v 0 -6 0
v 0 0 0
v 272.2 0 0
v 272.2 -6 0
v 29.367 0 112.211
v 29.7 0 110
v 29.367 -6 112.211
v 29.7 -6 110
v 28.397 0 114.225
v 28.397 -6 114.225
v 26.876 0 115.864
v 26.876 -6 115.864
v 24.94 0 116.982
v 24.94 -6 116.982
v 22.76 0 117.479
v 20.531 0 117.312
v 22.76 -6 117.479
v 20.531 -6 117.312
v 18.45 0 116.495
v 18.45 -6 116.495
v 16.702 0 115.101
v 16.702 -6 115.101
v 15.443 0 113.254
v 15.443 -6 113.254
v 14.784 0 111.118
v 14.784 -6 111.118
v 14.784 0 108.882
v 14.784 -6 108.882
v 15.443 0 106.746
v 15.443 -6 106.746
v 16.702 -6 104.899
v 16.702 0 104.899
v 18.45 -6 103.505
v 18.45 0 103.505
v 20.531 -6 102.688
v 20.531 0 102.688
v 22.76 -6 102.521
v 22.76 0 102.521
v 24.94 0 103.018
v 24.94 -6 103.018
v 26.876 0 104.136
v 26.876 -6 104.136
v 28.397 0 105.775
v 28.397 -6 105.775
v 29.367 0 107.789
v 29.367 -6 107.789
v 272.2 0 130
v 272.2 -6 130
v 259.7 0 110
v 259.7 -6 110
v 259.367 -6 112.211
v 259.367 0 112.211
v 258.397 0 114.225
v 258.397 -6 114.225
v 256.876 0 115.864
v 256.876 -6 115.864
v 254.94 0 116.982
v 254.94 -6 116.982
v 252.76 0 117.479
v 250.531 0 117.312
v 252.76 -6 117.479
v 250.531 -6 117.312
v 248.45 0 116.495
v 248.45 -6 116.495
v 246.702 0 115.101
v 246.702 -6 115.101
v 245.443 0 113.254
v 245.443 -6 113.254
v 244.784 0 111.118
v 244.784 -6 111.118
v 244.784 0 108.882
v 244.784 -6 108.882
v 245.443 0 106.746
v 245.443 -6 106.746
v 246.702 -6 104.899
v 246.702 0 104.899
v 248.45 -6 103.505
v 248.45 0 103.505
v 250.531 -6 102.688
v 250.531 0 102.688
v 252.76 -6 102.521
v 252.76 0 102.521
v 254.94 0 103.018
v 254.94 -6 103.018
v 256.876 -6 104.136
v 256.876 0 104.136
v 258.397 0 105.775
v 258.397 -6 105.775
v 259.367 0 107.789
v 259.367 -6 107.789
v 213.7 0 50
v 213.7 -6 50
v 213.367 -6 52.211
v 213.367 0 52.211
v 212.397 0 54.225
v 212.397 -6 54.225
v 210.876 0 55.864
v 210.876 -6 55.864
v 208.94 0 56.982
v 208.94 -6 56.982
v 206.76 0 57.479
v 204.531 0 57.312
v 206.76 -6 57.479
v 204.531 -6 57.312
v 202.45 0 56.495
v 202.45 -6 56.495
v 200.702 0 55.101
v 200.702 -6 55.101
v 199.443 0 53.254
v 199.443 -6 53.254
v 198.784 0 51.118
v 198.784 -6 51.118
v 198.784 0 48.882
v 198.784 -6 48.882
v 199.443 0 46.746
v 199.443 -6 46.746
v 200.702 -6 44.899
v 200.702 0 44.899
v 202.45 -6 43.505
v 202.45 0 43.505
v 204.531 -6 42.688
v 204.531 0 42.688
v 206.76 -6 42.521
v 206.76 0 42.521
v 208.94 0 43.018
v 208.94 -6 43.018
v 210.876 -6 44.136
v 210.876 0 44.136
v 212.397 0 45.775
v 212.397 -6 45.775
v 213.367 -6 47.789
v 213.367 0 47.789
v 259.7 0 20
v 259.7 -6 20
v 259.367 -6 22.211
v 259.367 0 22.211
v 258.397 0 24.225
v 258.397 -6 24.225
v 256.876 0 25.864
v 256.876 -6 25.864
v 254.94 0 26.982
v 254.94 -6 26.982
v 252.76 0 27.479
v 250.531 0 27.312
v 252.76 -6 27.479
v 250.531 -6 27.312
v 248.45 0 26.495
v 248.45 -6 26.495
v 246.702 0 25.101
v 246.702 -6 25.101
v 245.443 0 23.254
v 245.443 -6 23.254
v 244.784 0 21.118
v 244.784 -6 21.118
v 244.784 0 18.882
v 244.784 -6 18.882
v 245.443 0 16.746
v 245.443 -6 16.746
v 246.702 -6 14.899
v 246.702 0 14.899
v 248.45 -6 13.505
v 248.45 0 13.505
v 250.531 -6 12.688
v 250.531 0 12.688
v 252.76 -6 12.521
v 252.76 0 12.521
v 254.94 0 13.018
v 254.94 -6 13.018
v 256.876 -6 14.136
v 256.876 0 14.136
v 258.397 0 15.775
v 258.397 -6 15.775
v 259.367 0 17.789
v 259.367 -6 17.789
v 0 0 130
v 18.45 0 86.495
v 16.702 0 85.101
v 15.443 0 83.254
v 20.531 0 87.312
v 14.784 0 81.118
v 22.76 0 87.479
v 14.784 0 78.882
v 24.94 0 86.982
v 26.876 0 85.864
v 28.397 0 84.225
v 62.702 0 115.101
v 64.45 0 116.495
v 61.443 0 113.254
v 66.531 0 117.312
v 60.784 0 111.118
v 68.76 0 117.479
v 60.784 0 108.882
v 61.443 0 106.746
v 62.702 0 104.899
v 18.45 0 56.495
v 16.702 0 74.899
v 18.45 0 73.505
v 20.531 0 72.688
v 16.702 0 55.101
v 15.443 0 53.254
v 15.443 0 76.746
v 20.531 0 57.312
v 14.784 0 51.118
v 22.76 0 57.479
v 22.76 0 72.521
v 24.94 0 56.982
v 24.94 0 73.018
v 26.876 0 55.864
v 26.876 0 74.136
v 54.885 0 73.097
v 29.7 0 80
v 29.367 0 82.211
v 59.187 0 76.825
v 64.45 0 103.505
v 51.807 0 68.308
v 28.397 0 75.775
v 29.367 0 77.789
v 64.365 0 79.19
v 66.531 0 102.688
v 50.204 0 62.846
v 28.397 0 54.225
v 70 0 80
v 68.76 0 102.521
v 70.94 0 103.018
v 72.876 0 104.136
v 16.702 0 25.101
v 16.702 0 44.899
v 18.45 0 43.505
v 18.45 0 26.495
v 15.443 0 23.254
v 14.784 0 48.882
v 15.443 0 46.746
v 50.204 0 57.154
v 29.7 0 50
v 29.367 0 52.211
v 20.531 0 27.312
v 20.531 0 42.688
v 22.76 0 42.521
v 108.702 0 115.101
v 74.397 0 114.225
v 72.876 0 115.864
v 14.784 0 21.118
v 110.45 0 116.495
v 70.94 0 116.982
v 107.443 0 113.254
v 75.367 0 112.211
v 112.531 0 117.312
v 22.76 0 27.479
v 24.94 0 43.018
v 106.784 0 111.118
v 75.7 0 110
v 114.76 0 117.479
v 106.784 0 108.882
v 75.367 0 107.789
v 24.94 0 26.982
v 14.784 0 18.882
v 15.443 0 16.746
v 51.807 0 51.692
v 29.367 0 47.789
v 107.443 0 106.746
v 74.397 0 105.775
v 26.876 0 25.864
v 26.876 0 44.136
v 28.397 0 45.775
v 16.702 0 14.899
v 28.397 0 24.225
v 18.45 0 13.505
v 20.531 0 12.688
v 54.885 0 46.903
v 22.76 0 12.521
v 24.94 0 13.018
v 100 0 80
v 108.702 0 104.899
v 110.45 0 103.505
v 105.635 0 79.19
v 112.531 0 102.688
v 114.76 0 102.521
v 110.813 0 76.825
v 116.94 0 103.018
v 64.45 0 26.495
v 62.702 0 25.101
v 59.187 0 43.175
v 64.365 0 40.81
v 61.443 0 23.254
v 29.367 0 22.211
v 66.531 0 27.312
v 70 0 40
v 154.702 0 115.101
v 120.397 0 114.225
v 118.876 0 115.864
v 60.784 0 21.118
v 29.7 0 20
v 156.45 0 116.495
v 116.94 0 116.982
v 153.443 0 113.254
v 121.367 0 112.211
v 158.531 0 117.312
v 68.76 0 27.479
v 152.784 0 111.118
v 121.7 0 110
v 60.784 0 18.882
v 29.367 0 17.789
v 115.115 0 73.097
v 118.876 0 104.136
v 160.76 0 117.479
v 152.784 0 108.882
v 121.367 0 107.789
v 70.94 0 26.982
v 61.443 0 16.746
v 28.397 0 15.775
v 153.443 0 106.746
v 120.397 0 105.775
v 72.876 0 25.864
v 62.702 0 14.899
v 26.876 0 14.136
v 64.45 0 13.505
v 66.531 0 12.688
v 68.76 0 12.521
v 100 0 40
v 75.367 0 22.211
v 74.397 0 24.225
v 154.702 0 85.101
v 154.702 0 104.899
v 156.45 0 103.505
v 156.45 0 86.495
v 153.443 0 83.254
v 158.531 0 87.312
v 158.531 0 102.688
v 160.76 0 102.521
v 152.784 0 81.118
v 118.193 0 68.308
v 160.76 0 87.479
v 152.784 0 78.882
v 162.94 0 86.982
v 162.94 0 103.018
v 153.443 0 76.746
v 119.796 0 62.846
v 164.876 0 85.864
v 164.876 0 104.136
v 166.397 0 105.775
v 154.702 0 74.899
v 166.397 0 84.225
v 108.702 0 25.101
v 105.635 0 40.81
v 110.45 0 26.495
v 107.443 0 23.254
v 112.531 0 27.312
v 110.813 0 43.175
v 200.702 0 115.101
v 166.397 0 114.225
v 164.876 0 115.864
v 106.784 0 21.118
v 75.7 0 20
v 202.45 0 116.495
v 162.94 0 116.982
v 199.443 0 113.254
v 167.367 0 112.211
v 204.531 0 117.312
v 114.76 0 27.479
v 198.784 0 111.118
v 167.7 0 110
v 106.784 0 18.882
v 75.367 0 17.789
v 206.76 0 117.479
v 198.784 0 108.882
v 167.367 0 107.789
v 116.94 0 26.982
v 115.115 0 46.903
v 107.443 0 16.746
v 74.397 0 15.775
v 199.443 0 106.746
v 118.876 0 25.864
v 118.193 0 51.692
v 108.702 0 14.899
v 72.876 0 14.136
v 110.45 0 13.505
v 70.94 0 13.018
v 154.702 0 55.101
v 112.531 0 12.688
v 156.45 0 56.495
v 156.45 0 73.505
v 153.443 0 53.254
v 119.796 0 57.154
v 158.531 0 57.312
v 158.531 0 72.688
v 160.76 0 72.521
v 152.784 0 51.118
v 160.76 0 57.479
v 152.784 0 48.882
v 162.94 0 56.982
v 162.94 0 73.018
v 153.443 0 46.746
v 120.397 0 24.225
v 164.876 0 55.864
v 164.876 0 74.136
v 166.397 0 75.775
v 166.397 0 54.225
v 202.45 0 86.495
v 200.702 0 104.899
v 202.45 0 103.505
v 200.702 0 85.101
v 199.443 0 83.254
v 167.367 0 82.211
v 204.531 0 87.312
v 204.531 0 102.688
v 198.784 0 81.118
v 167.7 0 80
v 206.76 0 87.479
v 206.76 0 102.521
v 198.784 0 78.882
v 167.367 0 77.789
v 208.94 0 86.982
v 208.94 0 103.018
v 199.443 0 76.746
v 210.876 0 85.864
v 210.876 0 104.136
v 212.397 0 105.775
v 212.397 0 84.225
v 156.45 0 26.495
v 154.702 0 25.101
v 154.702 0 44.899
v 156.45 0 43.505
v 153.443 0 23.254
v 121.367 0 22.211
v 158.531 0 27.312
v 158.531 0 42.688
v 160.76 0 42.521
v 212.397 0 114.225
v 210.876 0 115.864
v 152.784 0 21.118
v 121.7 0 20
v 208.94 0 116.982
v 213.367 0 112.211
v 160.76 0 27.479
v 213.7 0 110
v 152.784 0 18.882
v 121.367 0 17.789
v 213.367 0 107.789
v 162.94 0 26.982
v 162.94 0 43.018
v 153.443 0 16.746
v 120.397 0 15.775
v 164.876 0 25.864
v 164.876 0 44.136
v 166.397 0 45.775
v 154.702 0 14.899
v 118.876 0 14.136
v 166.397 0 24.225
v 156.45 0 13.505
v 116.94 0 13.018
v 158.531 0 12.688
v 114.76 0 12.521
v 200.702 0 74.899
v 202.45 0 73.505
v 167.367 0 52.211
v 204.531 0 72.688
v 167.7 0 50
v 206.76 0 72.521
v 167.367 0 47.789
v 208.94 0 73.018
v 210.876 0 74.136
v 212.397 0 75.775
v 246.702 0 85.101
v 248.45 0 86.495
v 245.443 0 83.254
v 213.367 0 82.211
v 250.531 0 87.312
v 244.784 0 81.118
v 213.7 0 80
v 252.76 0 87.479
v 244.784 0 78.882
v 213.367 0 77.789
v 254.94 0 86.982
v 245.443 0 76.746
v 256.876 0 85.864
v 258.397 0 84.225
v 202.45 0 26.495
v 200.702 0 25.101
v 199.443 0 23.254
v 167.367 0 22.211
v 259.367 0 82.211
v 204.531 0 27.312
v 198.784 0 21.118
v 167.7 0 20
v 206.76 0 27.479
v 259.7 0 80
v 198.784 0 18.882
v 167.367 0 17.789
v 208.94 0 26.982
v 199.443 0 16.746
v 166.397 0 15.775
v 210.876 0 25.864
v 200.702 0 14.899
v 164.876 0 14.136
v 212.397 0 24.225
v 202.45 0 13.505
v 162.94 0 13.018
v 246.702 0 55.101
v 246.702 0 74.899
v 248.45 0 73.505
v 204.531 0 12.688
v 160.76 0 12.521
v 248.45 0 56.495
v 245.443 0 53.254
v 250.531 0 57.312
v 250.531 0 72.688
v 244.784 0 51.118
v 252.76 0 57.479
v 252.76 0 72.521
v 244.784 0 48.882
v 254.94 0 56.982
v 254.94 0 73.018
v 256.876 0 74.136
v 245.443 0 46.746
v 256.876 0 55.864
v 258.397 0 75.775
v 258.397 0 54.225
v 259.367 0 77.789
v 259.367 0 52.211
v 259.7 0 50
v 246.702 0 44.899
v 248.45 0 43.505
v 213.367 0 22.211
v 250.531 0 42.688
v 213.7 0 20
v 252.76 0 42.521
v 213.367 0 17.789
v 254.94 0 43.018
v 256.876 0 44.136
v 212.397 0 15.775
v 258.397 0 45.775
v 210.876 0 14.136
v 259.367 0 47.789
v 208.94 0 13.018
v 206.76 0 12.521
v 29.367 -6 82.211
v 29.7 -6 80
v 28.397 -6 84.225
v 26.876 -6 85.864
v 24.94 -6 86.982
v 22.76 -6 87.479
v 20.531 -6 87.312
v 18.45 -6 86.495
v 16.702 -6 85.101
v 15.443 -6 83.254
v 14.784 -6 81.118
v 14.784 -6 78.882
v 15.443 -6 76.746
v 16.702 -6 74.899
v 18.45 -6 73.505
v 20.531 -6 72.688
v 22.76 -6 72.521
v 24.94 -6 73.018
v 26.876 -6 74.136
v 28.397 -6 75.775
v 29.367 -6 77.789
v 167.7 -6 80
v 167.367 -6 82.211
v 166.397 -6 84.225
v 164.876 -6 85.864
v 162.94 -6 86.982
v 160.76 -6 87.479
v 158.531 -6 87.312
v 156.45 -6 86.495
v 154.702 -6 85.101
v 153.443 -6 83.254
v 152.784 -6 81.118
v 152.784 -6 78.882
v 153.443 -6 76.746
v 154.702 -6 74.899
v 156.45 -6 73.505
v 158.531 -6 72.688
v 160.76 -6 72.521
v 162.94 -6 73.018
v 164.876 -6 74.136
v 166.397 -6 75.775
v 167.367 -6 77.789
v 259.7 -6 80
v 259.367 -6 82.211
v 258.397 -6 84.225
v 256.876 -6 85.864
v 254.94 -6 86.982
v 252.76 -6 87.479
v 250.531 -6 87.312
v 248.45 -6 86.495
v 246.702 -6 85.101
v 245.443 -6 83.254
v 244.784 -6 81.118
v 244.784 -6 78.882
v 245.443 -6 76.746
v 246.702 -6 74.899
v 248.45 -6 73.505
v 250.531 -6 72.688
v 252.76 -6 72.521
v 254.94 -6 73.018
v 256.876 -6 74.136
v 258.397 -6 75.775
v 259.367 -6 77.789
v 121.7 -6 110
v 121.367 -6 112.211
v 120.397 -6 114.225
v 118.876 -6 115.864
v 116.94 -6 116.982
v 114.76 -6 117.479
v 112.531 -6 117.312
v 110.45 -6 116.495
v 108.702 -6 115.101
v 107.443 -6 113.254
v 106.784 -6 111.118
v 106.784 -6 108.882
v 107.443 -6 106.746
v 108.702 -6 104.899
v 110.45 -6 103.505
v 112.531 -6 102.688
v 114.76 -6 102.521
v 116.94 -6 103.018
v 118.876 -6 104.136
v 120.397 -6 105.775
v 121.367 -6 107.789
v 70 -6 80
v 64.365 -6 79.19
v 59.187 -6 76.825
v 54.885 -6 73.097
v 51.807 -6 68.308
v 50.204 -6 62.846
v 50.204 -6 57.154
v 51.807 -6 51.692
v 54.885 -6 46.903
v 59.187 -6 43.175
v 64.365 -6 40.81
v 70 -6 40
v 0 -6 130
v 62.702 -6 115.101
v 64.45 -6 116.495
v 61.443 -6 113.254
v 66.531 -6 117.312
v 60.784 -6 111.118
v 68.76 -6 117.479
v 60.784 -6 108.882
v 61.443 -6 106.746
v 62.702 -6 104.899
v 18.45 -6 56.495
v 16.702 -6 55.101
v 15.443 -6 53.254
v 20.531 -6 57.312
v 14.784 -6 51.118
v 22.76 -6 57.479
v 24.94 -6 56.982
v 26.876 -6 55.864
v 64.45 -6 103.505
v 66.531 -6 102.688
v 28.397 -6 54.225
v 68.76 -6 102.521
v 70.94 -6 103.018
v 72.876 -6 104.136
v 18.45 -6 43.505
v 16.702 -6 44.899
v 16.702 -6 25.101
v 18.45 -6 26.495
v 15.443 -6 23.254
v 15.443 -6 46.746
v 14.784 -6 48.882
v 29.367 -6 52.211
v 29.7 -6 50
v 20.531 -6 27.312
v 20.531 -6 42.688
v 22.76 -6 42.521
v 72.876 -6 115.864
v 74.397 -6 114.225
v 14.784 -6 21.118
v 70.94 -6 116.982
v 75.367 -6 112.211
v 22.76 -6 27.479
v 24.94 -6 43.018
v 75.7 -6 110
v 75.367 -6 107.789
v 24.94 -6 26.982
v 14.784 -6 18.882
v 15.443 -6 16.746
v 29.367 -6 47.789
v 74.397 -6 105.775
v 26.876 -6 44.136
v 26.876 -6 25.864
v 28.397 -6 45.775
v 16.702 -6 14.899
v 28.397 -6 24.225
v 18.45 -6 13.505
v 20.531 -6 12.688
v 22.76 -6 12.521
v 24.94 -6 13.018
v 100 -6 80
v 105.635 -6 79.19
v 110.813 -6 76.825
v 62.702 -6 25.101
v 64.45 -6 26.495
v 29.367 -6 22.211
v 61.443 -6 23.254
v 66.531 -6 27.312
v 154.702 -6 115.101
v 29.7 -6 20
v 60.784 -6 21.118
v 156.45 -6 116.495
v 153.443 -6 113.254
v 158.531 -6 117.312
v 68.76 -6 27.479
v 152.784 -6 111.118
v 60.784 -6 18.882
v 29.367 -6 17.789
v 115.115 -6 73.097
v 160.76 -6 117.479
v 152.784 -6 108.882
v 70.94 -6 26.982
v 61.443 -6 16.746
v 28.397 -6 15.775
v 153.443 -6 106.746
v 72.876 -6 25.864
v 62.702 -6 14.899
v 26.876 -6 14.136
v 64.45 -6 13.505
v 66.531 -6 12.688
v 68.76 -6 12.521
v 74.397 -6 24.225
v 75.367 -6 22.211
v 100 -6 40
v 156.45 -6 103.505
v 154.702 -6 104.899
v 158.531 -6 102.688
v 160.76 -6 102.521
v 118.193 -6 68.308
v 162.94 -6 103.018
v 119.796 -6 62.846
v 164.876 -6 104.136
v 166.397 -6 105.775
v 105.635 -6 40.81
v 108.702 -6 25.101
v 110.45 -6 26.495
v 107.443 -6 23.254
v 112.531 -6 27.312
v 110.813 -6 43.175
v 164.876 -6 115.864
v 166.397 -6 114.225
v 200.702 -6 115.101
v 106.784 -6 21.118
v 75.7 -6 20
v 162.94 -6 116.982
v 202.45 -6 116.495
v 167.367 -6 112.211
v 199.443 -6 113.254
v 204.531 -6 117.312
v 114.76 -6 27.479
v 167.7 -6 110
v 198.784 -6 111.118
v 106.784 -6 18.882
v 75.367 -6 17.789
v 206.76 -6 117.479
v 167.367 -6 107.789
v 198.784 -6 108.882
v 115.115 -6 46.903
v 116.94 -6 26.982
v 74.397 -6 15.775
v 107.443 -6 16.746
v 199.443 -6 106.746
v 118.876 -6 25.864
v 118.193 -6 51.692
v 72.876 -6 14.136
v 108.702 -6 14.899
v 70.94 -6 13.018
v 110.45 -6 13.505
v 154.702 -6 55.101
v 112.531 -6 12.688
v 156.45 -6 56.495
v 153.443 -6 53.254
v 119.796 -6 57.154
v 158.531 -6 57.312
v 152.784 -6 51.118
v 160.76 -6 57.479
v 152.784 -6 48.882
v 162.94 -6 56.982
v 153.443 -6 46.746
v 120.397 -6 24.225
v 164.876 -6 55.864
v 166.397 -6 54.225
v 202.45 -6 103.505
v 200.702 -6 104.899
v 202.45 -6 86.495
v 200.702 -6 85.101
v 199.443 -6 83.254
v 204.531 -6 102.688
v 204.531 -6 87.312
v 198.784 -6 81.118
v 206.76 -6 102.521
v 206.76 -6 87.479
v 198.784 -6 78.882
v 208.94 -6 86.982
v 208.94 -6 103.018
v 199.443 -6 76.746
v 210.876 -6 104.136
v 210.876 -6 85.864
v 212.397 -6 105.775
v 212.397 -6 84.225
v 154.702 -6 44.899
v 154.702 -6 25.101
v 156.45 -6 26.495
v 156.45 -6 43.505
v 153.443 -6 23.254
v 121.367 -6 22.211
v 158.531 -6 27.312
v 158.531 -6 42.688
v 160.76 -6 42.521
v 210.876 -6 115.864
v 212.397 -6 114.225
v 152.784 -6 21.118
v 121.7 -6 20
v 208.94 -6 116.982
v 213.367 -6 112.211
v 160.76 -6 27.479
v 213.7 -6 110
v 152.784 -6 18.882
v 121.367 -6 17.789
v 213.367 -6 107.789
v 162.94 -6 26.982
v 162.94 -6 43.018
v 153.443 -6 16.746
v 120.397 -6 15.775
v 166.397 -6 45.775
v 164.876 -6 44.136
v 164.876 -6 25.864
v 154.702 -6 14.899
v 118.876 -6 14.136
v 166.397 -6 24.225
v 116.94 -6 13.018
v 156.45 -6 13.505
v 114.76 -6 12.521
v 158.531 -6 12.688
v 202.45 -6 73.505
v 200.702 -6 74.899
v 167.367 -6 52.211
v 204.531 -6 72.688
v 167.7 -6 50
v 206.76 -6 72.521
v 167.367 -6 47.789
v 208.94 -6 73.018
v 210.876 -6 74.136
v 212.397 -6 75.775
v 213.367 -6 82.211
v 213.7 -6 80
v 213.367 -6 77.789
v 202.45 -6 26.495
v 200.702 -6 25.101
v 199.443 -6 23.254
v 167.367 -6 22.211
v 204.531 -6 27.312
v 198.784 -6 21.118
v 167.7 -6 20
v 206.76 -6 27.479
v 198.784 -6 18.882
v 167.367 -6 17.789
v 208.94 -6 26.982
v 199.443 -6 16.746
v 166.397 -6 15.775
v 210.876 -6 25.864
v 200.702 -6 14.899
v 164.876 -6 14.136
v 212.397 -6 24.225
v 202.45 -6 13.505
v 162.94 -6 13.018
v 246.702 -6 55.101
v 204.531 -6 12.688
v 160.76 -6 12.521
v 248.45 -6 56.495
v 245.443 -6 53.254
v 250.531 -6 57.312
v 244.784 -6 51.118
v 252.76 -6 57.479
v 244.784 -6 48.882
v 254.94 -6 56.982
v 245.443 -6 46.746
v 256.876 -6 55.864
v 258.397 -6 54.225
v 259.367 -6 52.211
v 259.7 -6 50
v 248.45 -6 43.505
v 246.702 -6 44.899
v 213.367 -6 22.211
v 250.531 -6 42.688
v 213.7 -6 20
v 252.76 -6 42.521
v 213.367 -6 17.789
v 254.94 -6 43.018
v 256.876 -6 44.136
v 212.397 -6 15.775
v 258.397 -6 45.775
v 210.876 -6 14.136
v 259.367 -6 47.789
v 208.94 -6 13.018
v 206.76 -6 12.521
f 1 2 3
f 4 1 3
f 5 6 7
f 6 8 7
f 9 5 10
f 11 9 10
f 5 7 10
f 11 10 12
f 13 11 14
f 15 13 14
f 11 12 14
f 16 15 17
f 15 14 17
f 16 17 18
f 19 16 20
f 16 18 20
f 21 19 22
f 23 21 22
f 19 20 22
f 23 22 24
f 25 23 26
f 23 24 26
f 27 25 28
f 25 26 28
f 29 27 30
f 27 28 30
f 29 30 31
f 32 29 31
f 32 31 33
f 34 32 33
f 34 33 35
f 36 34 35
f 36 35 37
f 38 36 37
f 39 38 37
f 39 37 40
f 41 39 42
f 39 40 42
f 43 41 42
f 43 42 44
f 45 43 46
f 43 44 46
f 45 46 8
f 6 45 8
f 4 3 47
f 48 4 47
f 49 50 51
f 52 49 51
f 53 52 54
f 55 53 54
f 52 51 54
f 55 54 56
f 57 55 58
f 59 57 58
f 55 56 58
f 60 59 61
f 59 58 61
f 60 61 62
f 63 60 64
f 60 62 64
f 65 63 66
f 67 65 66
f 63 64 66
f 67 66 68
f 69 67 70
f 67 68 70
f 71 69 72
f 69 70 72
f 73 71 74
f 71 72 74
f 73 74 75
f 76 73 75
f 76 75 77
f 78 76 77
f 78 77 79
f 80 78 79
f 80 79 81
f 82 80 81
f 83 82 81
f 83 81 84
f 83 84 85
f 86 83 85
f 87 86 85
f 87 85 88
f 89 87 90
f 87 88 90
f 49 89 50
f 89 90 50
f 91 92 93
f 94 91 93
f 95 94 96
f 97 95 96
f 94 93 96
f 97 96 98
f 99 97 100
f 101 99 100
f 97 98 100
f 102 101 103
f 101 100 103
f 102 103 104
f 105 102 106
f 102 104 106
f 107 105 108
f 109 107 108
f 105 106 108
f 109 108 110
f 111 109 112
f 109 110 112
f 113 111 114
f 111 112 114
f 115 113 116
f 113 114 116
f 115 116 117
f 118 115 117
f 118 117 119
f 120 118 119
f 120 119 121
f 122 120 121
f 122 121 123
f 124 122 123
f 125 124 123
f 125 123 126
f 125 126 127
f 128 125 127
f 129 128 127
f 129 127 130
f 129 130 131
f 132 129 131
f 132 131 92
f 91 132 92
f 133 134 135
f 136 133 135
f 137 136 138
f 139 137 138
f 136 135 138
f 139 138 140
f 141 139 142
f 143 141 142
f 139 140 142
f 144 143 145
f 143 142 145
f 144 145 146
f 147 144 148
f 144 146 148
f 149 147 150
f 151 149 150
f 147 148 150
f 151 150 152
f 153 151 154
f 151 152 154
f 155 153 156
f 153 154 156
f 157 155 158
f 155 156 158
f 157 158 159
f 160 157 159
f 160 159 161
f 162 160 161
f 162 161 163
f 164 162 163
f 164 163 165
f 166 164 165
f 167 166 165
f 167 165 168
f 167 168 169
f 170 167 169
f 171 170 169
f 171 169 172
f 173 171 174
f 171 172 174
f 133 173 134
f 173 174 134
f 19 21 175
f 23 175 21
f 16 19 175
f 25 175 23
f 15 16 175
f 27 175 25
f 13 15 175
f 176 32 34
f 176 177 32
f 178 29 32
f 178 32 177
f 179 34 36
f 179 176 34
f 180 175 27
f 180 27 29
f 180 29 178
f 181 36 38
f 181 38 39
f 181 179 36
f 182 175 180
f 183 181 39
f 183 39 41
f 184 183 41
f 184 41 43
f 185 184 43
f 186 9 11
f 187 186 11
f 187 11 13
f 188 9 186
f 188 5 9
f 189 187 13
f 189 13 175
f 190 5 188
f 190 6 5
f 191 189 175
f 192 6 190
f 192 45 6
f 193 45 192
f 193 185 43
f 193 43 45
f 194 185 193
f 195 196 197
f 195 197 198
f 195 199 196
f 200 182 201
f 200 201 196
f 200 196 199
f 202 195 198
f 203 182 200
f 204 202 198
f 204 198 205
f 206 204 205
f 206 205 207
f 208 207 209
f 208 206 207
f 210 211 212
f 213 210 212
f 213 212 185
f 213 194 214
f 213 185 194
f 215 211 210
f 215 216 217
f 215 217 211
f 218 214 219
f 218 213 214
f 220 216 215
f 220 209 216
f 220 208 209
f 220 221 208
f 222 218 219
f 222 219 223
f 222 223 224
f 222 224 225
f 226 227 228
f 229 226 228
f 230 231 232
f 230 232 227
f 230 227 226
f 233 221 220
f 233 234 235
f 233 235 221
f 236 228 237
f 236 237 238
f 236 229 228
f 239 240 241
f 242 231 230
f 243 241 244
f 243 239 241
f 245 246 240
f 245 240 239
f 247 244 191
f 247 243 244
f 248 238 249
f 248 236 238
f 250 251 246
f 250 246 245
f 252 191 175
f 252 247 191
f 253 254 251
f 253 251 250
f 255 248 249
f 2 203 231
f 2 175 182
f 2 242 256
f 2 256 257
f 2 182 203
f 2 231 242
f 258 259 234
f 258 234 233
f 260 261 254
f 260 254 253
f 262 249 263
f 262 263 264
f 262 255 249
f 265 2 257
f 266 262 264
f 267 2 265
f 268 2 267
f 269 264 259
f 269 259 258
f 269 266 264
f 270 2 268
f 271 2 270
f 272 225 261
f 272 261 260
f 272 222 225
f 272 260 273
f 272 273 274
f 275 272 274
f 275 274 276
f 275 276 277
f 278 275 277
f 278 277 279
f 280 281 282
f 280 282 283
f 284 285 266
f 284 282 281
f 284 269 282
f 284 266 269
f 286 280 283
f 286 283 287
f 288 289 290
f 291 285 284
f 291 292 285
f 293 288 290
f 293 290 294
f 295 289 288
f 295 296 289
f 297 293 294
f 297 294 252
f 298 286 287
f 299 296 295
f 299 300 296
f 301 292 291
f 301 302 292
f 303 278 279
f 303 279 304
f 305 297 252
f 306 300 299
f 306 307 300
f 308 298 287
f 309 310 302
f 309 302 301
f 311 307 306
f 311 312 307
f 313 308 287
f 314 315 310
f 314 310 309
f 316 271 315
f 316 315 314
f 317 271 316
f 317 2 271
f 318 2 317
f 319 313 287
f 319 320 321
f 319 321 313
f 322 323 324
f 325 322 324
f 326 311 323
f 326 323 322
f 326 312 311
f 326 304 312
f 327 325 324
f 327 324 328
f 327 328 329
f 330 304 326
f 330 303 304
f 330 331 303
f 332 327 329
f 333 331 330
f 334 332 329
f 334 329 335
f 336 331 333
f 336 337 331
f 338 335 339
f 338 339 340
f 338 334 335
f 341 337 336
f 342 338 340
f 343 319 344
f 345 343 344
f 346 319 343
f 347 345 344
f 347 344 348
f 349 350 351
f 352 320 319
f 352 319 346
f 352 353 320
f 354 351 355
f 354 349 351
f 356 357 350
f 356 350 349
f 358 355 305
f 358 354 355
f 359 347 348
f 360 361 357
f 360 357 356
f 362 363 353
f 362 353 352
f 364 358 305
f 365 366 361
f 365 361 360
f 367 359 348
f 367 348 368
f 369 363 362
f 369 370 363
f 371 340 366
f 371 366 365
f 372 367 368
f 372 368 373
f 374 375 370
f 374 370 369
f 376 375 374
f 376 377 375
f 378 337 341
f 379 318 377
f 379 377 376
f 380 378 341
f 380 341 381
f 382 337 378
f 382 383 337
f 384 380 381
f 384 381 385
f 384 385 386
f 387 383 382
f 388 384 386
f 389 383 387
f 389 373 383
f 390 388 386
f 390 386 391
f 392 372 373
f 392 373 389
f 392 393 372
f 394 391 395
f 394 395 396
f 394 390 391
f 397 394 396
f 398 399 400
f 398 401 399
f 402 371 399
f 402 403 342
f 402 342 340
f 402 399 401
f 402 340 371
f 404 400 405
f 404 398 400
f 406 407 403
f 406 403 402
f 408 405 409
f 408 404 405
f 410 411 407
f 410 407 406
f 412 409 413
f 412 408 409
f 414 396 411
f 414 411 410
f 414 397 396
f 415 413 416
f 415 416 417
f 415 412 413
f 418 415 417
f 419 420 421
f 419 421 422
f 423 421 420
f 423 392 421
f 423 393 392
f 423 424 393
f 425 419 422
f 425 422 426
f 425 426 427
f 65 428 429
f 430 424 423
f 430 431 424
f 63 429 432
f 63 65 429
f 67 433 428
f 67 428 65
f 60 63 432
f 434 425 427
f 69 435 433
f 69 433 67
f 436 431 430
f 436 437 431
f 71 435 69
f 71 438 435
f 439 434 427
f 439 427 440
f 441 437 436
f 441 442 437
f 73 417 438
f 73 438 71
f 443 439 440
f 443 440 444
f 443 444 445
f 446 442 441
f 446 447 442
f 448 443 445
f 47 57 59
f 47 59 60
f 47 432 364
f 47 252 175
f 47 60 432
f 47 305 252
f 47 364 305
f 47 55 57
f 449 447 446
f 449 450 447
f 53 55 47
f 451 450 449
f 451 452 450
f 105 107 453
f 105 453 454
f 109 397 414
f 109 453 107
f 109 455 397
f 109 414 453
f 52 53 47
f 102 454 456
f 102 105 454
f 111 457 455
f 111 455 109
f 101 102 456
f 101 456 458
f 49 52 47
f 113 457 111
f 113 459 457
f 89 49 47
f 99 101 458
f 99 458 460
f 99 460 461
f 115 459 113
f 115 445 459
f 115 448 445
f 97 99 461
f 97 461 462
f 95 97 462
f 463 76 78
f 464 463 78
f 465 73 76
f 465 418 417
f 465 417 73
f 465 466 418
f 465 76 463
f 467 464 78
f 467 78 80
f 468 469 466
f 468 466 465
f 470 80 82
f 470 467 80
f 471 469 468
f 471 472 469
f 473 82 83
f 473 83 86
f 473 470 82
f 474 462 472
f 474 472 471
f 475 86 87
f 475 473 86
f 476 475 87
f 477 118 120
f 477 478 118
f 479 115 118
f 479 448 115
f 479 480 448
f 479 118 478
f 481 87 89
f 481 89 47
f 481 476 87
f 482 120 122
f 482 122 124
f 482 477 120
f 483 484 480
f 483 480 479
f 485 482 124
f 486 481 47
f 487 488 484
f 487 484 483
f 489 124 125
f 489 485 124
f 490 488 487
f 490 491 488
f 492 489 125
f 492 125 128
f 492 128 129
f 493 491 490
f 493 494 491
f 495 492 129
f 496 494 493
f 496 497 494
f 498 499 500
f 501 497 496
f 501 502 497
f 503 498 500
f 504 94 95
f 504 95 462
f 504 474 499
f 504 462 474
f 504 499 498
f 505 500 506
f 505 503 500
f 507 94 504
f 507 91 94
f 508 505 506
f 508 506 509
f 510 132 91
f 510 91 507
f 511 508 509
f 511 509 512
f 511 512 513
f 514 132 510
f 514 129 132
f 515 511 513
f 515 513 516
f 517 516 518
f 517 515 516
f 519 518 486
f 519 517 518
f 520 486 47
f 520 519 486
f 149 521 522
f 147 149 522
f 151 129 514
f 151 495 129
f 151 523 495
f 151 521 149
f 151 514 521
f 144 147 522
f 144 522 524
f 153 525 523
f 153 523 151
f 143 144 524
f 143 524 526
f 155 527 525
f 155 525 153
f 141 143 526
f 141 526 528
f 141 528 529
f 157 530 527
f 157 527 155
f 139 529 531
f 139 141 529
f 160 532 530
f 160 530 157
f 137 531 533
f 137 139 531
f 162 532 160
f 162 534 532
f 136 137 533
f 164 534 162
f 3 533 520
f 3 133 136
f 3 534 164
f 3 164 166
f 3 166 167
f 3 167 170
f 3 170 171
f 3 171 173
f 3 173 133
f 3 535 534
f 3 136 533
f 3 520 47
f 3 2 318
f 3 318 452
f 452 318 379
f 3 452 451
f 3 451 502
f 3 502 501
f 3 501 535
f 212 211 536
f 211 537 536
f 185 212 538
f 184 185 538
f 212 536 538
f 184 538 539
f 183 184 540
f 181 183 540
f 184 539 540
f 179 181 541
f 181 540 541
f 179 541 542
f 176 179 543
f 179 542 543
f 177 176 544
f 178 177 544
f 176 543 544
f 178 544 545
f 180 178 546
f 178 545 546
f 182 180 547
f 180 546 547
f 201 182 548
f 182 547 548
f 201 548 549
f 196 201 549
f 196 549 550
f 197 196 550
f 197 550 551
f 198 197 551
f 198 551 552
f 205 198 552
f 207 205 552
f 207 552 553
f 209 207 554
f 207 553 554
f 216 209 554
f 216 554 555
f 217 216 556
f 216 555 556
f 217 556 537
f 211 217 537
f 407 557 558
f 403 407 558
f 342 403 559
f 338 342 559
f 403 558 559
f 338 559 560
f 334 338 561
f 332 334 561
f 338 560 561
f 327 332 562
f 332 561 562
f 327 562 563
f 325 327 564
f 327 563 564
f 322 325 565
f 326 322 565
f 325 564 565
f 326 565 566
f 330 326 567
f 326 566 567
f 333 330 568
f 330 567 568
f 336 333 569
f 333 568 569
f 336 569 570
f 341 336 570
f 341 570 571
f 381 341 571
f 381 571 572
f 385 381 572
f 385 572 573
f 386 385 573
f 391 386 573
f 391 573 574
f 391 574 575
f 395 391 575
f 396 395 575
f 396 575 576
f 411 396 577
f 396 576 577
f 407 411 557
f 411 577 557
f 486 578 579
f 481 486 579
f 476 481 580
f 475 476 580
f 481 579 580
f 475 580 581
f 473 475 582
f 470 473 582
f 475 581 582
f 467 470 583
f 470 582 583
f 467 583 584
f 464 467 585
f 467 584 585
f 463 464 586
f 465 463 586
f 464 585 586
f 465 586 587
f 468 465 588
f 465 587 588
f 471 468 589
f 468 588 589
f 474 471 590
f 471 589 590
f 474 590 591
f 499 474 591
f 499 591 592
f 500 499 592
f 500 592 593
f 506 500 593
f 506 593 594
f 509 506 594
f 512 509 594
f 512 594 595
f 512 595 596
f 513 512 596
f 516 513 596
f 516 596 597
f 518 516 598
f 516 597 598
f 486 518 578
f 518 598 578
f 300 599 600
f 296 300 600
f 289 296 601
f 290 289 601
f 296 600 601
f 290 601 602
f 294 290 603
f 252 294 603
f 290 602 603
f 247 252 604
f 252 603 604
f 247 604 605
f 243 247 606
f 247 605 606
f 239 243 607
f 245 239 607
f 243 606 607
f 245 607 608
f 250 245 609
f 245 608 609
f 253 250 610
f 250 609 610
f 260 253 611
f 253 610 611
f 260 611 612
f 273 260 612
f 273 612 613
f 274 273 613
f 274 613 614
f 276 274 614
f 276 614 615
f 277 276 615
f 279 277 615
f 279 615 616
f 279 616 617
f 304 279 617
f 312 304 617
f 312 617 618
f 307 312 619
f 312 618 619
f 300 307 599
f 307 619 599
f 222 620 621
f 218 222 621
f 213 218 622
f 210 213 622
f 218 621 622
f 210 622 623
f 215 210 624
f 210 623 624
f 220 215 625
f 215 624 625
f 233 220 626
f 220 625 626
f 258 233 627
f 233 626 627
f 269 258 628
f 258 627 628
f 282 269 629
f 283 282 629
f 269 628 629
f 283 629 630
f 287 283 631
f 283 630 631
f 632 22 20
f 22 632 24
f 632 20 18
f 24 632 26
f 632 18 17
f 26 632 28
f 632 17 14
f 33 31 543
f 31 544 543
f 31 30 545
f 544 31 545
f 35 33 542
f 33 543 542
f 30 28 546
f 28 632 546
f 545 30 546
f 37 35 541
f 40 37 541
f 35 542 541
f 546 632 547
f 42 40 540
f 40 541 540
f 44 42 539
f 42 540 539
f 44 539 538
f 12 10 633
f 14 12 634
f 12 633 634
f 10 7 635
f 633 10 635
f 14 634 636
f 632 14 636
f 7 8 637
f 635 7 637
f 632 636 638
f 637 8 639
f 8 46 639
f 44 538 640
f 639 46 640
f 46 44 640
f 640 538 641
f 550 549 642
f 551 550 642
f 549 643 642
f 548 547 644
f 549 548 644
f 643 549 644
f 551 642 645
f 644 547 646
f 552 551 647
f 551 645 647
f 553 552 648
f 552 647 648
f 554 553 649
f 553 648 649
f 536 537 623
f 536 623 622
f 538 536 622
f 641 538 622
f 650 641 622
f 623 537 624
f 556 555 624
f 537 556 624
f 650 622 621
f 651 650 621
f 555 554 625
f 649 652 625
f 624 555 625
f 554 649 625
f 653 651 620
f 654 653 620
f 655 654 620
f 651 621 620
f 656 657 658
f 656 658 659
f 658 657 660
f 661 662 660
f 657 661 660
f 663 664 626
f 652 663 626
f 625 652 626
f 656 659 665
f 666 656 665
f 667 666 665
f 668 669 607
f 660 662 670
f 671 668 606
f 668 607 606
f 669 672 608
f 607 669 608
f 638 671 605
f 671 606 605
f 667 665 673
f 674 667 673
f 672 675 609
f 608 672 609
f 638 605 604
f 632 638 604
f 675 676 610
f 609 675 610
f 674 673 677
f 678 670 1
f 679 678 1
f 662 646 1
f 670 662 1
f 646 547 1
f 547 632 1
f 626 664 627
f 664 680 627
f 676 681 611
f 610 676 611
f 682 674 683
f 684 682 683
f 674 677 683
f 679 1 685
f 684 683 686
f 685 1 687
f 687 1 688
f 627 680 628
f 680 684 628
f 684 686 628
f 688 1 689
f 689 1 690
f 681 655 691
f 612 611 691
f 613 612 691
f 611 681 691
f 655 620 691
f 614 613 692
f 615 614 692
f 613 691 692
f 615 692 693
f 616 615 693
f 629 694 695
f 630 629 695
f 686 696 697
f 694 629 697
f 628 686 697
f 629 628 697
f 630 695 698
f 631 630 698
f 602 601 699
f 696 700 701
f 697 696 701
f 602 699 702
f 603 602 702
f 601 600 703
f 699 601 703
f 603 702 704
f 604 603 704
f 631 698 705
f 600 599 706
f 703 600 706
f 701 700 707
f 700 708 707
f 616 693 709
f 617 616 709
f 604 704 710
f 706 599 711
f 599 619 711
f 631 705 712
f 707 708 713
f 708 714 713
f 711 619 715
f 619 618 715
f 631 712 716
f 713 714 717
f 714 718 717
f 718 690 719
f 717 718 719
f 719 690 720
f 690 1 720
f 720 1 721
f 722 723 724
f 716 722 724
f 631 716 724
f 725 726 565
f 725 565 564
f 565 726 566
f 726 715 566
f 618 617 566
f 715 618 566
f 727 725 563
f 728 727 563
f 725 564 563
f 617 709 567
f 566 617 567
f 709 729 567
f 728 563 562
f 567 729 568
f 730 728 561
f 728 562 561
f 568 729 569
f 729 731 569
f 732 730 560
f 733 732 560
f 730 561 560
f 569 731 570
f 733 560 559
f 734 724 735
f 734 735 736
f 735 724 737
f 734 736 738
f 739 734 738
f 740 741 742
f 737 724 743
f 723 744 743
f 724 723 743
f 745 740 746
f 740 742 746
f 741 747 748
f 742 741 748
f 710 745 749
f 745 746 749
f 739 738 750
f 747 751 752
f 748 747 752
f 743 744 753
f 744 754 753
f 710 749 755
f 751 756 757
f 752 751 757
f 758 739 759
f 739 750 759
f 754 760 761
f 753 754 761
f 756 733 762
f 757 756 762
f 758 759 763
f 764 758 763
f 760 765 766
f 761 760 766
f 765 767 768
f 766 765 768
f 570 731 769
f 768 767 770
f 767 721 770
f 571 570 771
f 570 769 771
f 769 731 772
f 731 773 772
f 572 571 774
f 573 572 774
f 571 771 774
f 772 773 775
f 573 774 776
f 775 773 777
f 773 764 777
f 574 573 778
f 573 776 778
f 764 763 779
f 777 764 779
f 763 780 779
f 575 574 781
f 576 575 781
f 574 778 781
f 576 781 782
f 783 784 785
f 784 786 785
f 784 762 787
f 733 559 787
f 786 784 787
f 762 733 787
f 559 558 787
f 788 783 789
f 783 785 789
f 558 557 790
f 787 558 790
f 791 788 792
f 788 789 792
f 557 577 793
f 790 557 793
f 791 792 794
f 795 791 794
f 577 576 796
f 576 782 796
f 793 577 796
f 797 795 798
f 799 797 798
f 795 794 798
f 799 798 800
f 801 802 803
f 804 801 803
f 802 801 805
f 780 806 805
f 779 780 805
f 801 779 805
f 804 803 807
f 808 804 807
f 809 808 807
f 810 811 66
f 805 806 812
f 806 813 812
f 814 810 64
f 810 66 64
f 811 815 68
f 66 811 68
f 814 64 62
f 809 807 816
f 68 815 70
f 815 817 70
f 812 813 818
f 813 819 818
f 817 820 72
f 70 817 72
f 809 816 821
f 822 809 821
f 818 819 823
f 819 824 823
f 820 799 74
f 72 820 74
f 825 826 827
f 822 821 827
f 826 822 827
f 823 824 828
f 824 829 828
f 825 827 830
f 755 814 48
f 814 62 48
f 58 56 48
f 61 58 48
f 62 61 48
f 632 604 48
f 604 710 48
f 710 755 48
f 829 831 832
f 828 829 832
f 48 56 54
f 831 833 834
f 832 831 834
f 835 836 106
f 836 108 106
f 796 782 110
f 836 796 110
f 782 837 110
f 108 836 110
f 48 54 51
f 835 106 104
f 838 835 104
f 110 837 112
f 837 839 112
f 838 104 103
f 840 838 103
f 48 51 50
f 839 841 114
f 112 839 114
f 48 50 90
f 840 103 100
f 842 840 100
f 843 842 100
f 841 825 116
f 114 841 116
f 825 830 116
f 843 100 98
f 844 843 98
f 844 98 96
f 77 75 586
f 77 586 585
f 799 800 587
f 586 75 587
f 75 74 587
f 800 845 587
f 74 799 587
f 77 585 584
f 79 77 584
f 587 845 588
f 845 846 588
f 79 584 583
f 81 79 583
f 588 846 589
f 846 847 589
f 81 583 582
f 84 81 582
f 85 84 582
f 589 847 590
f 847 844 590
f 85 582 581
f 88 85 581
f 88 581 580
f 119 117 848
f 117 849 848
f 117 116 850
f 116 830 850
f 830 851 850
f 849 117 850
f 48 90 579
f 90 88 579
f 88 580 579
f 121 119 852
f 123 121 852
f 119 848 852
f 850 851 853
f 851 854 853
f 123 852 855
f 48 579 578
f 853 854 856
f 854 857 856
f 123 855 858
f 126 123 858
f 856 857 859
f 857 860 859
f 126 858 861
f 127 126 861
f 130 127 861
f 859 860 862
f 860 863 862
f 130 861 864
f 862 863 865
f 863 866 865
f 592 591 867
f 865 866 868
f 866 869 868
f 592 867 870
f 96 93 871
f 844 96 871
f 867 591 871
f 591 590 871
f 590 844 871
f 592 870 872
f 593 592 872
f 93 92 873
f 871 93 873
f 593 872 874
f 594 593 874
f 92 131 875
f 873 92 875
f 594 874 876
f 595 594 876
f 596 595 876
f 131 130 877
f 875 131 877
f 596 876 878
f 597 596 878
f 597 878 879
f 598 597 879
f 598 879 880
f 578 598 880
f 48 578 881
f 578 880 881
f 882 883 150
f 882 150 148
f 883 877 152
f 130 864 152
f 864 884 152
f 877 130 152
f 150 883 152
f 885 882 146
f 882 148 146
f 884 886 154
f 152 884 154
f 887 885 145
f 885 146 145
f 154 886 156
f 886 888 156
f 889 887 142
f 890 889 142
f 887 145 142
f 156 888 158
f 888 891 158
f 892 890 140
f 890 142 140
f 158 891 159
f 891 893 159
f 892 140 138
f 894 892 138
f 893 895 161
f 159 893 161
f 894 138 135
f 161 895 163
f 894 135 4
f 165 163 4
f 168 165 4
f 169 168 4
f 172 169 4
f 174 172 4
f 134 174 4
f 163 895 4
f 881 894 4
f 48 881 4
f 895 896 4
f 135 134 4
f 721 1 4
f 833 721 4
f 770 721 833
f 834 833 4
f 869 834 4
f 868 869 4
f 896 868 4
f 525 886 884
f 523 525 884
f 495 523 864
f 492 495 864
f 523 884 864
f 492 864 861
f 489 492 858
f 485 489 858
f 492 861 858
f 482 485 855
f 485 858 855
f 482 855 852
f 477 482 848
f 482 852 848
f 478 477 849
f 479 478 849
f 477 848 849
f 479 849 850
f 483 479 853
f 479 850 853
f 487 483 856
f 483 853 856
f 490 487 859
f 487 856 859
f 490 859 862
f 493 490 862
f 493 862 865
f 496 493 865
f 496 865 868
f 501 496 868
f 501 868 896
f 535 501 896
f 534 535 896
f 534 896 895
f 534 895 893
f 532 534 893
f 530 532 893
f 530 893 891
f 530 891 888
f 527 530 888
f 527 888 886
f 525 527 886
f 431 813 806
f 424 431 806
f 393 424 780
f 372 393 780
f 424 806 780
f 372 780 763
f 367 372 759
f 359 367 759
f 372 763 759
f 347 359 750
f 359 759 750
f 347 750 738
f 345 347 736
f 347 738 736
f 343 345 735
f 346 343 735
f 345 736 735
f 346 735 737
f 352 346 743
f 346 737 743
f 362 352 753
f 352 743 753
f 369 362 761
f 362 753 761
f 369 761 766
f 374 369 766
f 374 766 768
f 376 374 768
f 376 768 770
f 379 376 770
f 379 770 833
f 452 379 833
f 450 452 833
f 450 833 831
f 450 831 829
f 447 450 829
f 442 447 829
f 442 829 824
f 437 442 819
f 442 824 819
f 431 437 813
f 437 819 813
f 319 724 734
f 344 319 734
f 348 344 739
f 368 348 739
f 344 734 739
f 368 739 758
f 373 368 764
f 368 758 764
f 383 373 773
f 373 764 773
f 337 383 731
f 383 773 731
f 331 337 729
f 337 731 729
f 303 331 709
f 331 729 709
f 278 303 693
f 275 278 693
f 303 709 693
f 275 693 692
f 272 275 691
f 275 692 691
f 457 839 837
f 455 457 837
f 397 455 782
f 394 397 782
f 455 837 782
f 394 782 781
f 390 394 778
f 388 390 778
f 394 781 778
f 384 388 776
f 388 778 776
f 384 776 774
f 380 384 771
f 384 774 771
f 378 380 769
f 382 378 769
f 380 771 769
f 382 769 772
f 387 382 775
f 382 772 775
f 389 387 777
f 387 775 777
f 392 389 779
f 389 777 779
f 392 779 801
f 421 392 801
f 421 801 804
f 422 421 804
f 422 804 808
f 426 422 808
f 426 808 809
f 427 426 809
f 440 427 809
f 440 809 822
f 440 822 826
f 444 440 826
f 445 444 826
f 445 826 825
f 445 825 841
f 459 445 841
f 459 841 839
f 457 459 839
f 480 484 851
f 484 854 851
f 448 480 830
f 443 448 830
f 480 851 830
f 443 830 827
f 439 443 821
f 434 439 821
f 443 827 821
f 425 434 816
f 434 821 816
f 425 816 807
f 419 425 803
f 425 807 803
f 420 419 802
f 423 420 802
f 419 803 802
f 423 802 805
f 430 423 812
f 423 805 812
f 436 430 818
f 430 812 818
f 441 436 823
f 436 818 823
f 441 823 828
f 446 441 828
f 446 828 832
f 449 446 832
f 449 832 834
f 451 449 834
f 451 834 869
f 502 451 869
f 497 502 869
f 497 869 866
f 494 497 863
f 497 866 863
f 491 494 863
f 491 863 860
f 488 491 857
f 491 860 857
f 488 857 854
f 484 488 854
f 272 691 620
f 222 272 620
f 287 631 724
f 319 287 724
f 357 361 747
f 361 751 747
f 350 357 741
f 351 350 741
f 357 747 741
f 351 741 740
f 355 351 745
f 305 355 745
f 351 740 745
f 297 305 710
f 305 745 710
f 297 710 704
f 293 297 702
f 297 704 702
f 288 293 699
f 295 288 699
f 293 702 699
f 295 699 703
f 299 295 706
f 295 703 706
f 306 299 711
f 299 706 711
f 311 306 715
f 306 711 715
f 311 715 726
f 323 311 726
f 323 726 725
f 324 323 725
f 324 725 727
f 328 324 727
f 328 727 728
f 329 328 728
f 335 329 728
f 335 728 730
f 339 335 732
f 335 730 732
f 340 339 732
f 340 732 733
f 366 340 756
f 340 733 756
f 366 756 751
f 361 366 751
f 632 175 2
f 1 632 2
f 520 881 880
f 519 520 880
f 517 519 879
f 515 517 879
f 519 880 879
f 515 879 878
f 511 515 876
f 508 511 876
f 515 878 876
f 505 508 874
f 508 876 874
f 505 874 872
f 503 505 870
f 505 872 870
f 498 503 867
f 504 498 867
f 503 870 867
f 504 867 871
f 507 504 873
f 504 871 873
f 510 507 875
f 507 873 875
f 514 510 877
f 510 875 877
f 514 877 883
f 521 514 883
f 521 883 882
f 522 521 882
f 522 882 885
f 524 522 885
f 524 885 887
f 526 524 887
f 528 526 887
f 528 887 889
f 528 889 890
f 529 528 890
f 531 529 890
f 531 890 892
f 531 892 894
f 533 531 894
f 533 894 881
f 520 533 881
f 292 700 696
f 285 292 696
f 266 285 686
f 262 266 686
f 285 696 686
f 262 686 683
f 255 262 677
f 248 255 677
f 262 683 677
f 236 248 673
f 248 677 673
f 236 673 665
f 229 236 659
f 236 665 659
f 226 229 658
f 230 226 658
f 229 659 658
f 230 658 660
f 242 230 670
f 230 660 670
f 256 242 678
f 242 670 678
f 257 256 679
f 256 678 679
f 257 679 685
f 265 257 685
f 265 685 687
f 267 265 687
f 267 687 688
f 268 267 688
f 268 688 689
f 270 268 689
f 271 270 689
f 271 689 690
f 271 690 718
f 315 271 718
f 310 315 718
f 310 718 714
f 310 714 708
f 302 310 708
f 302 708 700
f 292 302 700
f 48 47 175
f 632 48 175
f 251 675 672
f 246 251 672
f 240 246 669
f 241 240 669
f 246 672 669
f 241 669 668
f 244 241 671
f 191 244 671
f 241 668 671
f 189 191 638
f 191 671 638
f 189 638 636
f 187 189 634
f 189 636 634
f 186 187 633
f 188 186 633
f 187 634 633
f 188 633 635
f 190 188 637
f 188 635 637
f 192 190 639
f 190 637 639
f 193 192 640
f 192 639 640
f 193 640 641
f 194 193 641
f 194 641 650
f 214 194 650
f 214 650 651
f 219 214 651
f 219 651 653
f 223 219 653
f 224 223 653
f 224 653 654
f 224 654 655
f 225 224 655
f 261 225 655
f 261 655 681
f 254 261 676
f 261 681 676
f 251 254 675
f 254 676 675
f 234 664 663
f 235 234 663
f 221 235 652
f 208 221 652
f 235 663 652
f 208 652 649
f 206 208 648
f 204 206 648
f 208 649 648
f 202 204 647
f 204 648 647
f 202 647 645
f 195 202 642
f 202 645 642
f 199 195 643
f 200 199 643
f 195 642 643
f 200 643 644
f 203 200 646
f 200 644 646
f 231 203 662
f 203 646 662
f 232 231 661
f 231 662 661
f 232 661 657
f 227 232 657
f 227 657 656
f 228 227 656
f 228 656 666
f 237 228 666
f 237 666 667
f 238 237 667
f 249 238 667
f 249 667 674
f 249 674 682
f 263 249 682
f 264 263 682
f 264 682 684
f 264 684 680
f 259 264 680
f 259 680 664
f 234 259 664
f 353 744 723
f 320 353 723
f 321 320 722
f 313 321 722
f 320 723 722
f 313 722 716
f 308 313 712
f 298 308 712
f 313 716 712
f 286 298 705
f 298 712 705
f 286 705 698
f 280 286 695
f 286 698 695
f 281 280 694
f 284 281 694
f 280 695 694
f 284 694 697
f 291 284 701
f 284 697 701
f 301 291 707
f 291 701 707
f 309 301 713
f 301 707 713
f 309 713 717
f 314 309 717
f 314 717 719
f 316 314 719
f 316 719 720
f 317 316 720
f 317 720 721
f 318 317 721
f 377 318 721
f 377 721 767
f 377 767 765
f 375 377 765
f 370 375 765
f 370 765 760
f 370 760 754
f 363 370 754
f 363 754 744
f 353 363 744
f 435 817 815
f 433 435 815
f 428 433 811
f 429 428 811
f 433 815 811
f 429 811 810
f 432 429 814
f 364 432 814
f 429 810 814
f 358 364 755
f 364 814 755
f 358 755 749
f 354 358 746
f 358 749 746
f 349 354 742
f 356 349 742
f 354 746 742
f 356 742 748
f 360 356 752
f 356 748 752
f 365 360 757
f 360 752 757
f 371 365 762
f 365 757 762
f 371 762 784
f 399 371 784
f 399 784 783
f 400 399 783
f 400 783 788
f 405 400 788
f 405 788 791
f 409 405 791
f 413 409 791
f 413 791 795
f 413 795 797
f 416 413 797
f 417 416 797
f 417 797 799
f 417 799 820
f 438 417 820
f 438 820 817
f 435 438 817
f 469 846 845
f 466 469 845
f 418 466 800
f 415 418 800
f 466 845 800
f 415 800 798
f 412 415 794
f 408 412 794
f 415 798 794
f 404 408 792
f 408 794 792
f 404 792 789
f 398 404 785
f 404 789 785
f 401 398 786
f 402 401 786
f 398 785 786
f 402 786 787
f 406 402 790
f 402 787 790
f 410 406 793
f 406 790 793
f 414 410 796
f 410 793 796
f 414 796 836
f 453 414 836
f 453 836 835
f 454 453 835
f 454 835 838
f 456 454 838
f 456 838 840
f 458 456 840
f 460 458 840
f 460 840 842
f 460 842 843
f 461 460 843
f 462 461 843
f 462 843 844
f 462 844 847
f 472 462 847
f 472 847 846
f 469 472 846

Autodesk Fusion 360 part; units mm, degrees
sketch "Sketch1" plane through (0, 0, 0) normal (0, 1, 0) x (1, 0, 0)
  line L0 (0, 0) -> (272.2, 0)
  line L1 (272.2, 0) -> (272.2, -130)
  line L2 (272.2, -130) -> (0, -130)
  line L3 (0, -130) -> (0, 0)
  dimension "d1" = 272.2
  dimension "d2" = 130
extrude "Extrude1" add sketch "Sketch1" against normal blind 6
sketch "Sketch2" plane through (0, -6, 0) normal (0, -1, 0) x (1, 0, 0)
  line L0 (272.2, 130) -> (0, 130)
  line L1 (0, 130) -> (0, 0)
  line L2 (0, 0) -> (272.2, 0)
  line L3 (272.2, 0) -> (272.2, 130)
  line L4 (70, 40) -> (100, 40)
  arc A0 (100, 40) -> (100, 80) centre (100, 60) ccw
  line L5 (100, 80) -> (70, 80)
  arc A1 (70, 80) -> (70, 40) centre (70, 60) ccw
  line L6 (50, 60) -> (120, 60) construction
  circle A2 centre (252.2, 110) radius 7.5
  circle A3 centre (206.2, 110) radius 7.5
  circle A4 centre (160.2, 110) radius 7.5
  circle A5 centre (114.2, 110) radius 7.5
  circle A6 centre (68.2, 110) radius 7.5
  circle A7 centre (252.2, 80) radius 7.5
  circle A8 centre (206.2, 80) radius 7.5
  circle A9 centre (252.2, 50) radius 7.5
  circle A10 centre (206.2, 50) radius 7.5
  circle A11 centre (160.2, 50) radius 7.5
  circle A12 centre (22.2, 110) radius 7.5
  circle A13 centre (22.2, 80) radius 7.5
  circle A14 centre (22.2, 50) radius 7.5
  circle A15 centre (252.2, 20) radius 7.5
  circle A16 centre (206.2, 20) radius 7.5
  circle A17 centre (160.2, 20) radius 7.5
  circle A18 centre (114.2, 20) radius 7.5
  circle A19 centre (68.2, 20) radius 7.5
  circle A20 centre (22.2, 20) radius 7.5
  circle A21 centre (160.2, 80) radius 7.5
  dimension "d5" = 40
  dimension "d6" = 50
  dimension "d8" = 40
  dimension "d9" = 15
  dimension "d10" = 20
  dimension "d11" = 20
  dimension "d14" = -230
  dimension "d15" = -90
extrude "Extrude2" cut sketch "Sketch2" against normal up to surface (6 mm away) contours L4 A0 L5 A1 | A2 | A3 | A4 | A5 | A6 | A7 | A8 | A9 | A10 | A11 | A12 | A13 | A14 | A15 | A16 | A17 | A18 | A19 | A20 | A21
